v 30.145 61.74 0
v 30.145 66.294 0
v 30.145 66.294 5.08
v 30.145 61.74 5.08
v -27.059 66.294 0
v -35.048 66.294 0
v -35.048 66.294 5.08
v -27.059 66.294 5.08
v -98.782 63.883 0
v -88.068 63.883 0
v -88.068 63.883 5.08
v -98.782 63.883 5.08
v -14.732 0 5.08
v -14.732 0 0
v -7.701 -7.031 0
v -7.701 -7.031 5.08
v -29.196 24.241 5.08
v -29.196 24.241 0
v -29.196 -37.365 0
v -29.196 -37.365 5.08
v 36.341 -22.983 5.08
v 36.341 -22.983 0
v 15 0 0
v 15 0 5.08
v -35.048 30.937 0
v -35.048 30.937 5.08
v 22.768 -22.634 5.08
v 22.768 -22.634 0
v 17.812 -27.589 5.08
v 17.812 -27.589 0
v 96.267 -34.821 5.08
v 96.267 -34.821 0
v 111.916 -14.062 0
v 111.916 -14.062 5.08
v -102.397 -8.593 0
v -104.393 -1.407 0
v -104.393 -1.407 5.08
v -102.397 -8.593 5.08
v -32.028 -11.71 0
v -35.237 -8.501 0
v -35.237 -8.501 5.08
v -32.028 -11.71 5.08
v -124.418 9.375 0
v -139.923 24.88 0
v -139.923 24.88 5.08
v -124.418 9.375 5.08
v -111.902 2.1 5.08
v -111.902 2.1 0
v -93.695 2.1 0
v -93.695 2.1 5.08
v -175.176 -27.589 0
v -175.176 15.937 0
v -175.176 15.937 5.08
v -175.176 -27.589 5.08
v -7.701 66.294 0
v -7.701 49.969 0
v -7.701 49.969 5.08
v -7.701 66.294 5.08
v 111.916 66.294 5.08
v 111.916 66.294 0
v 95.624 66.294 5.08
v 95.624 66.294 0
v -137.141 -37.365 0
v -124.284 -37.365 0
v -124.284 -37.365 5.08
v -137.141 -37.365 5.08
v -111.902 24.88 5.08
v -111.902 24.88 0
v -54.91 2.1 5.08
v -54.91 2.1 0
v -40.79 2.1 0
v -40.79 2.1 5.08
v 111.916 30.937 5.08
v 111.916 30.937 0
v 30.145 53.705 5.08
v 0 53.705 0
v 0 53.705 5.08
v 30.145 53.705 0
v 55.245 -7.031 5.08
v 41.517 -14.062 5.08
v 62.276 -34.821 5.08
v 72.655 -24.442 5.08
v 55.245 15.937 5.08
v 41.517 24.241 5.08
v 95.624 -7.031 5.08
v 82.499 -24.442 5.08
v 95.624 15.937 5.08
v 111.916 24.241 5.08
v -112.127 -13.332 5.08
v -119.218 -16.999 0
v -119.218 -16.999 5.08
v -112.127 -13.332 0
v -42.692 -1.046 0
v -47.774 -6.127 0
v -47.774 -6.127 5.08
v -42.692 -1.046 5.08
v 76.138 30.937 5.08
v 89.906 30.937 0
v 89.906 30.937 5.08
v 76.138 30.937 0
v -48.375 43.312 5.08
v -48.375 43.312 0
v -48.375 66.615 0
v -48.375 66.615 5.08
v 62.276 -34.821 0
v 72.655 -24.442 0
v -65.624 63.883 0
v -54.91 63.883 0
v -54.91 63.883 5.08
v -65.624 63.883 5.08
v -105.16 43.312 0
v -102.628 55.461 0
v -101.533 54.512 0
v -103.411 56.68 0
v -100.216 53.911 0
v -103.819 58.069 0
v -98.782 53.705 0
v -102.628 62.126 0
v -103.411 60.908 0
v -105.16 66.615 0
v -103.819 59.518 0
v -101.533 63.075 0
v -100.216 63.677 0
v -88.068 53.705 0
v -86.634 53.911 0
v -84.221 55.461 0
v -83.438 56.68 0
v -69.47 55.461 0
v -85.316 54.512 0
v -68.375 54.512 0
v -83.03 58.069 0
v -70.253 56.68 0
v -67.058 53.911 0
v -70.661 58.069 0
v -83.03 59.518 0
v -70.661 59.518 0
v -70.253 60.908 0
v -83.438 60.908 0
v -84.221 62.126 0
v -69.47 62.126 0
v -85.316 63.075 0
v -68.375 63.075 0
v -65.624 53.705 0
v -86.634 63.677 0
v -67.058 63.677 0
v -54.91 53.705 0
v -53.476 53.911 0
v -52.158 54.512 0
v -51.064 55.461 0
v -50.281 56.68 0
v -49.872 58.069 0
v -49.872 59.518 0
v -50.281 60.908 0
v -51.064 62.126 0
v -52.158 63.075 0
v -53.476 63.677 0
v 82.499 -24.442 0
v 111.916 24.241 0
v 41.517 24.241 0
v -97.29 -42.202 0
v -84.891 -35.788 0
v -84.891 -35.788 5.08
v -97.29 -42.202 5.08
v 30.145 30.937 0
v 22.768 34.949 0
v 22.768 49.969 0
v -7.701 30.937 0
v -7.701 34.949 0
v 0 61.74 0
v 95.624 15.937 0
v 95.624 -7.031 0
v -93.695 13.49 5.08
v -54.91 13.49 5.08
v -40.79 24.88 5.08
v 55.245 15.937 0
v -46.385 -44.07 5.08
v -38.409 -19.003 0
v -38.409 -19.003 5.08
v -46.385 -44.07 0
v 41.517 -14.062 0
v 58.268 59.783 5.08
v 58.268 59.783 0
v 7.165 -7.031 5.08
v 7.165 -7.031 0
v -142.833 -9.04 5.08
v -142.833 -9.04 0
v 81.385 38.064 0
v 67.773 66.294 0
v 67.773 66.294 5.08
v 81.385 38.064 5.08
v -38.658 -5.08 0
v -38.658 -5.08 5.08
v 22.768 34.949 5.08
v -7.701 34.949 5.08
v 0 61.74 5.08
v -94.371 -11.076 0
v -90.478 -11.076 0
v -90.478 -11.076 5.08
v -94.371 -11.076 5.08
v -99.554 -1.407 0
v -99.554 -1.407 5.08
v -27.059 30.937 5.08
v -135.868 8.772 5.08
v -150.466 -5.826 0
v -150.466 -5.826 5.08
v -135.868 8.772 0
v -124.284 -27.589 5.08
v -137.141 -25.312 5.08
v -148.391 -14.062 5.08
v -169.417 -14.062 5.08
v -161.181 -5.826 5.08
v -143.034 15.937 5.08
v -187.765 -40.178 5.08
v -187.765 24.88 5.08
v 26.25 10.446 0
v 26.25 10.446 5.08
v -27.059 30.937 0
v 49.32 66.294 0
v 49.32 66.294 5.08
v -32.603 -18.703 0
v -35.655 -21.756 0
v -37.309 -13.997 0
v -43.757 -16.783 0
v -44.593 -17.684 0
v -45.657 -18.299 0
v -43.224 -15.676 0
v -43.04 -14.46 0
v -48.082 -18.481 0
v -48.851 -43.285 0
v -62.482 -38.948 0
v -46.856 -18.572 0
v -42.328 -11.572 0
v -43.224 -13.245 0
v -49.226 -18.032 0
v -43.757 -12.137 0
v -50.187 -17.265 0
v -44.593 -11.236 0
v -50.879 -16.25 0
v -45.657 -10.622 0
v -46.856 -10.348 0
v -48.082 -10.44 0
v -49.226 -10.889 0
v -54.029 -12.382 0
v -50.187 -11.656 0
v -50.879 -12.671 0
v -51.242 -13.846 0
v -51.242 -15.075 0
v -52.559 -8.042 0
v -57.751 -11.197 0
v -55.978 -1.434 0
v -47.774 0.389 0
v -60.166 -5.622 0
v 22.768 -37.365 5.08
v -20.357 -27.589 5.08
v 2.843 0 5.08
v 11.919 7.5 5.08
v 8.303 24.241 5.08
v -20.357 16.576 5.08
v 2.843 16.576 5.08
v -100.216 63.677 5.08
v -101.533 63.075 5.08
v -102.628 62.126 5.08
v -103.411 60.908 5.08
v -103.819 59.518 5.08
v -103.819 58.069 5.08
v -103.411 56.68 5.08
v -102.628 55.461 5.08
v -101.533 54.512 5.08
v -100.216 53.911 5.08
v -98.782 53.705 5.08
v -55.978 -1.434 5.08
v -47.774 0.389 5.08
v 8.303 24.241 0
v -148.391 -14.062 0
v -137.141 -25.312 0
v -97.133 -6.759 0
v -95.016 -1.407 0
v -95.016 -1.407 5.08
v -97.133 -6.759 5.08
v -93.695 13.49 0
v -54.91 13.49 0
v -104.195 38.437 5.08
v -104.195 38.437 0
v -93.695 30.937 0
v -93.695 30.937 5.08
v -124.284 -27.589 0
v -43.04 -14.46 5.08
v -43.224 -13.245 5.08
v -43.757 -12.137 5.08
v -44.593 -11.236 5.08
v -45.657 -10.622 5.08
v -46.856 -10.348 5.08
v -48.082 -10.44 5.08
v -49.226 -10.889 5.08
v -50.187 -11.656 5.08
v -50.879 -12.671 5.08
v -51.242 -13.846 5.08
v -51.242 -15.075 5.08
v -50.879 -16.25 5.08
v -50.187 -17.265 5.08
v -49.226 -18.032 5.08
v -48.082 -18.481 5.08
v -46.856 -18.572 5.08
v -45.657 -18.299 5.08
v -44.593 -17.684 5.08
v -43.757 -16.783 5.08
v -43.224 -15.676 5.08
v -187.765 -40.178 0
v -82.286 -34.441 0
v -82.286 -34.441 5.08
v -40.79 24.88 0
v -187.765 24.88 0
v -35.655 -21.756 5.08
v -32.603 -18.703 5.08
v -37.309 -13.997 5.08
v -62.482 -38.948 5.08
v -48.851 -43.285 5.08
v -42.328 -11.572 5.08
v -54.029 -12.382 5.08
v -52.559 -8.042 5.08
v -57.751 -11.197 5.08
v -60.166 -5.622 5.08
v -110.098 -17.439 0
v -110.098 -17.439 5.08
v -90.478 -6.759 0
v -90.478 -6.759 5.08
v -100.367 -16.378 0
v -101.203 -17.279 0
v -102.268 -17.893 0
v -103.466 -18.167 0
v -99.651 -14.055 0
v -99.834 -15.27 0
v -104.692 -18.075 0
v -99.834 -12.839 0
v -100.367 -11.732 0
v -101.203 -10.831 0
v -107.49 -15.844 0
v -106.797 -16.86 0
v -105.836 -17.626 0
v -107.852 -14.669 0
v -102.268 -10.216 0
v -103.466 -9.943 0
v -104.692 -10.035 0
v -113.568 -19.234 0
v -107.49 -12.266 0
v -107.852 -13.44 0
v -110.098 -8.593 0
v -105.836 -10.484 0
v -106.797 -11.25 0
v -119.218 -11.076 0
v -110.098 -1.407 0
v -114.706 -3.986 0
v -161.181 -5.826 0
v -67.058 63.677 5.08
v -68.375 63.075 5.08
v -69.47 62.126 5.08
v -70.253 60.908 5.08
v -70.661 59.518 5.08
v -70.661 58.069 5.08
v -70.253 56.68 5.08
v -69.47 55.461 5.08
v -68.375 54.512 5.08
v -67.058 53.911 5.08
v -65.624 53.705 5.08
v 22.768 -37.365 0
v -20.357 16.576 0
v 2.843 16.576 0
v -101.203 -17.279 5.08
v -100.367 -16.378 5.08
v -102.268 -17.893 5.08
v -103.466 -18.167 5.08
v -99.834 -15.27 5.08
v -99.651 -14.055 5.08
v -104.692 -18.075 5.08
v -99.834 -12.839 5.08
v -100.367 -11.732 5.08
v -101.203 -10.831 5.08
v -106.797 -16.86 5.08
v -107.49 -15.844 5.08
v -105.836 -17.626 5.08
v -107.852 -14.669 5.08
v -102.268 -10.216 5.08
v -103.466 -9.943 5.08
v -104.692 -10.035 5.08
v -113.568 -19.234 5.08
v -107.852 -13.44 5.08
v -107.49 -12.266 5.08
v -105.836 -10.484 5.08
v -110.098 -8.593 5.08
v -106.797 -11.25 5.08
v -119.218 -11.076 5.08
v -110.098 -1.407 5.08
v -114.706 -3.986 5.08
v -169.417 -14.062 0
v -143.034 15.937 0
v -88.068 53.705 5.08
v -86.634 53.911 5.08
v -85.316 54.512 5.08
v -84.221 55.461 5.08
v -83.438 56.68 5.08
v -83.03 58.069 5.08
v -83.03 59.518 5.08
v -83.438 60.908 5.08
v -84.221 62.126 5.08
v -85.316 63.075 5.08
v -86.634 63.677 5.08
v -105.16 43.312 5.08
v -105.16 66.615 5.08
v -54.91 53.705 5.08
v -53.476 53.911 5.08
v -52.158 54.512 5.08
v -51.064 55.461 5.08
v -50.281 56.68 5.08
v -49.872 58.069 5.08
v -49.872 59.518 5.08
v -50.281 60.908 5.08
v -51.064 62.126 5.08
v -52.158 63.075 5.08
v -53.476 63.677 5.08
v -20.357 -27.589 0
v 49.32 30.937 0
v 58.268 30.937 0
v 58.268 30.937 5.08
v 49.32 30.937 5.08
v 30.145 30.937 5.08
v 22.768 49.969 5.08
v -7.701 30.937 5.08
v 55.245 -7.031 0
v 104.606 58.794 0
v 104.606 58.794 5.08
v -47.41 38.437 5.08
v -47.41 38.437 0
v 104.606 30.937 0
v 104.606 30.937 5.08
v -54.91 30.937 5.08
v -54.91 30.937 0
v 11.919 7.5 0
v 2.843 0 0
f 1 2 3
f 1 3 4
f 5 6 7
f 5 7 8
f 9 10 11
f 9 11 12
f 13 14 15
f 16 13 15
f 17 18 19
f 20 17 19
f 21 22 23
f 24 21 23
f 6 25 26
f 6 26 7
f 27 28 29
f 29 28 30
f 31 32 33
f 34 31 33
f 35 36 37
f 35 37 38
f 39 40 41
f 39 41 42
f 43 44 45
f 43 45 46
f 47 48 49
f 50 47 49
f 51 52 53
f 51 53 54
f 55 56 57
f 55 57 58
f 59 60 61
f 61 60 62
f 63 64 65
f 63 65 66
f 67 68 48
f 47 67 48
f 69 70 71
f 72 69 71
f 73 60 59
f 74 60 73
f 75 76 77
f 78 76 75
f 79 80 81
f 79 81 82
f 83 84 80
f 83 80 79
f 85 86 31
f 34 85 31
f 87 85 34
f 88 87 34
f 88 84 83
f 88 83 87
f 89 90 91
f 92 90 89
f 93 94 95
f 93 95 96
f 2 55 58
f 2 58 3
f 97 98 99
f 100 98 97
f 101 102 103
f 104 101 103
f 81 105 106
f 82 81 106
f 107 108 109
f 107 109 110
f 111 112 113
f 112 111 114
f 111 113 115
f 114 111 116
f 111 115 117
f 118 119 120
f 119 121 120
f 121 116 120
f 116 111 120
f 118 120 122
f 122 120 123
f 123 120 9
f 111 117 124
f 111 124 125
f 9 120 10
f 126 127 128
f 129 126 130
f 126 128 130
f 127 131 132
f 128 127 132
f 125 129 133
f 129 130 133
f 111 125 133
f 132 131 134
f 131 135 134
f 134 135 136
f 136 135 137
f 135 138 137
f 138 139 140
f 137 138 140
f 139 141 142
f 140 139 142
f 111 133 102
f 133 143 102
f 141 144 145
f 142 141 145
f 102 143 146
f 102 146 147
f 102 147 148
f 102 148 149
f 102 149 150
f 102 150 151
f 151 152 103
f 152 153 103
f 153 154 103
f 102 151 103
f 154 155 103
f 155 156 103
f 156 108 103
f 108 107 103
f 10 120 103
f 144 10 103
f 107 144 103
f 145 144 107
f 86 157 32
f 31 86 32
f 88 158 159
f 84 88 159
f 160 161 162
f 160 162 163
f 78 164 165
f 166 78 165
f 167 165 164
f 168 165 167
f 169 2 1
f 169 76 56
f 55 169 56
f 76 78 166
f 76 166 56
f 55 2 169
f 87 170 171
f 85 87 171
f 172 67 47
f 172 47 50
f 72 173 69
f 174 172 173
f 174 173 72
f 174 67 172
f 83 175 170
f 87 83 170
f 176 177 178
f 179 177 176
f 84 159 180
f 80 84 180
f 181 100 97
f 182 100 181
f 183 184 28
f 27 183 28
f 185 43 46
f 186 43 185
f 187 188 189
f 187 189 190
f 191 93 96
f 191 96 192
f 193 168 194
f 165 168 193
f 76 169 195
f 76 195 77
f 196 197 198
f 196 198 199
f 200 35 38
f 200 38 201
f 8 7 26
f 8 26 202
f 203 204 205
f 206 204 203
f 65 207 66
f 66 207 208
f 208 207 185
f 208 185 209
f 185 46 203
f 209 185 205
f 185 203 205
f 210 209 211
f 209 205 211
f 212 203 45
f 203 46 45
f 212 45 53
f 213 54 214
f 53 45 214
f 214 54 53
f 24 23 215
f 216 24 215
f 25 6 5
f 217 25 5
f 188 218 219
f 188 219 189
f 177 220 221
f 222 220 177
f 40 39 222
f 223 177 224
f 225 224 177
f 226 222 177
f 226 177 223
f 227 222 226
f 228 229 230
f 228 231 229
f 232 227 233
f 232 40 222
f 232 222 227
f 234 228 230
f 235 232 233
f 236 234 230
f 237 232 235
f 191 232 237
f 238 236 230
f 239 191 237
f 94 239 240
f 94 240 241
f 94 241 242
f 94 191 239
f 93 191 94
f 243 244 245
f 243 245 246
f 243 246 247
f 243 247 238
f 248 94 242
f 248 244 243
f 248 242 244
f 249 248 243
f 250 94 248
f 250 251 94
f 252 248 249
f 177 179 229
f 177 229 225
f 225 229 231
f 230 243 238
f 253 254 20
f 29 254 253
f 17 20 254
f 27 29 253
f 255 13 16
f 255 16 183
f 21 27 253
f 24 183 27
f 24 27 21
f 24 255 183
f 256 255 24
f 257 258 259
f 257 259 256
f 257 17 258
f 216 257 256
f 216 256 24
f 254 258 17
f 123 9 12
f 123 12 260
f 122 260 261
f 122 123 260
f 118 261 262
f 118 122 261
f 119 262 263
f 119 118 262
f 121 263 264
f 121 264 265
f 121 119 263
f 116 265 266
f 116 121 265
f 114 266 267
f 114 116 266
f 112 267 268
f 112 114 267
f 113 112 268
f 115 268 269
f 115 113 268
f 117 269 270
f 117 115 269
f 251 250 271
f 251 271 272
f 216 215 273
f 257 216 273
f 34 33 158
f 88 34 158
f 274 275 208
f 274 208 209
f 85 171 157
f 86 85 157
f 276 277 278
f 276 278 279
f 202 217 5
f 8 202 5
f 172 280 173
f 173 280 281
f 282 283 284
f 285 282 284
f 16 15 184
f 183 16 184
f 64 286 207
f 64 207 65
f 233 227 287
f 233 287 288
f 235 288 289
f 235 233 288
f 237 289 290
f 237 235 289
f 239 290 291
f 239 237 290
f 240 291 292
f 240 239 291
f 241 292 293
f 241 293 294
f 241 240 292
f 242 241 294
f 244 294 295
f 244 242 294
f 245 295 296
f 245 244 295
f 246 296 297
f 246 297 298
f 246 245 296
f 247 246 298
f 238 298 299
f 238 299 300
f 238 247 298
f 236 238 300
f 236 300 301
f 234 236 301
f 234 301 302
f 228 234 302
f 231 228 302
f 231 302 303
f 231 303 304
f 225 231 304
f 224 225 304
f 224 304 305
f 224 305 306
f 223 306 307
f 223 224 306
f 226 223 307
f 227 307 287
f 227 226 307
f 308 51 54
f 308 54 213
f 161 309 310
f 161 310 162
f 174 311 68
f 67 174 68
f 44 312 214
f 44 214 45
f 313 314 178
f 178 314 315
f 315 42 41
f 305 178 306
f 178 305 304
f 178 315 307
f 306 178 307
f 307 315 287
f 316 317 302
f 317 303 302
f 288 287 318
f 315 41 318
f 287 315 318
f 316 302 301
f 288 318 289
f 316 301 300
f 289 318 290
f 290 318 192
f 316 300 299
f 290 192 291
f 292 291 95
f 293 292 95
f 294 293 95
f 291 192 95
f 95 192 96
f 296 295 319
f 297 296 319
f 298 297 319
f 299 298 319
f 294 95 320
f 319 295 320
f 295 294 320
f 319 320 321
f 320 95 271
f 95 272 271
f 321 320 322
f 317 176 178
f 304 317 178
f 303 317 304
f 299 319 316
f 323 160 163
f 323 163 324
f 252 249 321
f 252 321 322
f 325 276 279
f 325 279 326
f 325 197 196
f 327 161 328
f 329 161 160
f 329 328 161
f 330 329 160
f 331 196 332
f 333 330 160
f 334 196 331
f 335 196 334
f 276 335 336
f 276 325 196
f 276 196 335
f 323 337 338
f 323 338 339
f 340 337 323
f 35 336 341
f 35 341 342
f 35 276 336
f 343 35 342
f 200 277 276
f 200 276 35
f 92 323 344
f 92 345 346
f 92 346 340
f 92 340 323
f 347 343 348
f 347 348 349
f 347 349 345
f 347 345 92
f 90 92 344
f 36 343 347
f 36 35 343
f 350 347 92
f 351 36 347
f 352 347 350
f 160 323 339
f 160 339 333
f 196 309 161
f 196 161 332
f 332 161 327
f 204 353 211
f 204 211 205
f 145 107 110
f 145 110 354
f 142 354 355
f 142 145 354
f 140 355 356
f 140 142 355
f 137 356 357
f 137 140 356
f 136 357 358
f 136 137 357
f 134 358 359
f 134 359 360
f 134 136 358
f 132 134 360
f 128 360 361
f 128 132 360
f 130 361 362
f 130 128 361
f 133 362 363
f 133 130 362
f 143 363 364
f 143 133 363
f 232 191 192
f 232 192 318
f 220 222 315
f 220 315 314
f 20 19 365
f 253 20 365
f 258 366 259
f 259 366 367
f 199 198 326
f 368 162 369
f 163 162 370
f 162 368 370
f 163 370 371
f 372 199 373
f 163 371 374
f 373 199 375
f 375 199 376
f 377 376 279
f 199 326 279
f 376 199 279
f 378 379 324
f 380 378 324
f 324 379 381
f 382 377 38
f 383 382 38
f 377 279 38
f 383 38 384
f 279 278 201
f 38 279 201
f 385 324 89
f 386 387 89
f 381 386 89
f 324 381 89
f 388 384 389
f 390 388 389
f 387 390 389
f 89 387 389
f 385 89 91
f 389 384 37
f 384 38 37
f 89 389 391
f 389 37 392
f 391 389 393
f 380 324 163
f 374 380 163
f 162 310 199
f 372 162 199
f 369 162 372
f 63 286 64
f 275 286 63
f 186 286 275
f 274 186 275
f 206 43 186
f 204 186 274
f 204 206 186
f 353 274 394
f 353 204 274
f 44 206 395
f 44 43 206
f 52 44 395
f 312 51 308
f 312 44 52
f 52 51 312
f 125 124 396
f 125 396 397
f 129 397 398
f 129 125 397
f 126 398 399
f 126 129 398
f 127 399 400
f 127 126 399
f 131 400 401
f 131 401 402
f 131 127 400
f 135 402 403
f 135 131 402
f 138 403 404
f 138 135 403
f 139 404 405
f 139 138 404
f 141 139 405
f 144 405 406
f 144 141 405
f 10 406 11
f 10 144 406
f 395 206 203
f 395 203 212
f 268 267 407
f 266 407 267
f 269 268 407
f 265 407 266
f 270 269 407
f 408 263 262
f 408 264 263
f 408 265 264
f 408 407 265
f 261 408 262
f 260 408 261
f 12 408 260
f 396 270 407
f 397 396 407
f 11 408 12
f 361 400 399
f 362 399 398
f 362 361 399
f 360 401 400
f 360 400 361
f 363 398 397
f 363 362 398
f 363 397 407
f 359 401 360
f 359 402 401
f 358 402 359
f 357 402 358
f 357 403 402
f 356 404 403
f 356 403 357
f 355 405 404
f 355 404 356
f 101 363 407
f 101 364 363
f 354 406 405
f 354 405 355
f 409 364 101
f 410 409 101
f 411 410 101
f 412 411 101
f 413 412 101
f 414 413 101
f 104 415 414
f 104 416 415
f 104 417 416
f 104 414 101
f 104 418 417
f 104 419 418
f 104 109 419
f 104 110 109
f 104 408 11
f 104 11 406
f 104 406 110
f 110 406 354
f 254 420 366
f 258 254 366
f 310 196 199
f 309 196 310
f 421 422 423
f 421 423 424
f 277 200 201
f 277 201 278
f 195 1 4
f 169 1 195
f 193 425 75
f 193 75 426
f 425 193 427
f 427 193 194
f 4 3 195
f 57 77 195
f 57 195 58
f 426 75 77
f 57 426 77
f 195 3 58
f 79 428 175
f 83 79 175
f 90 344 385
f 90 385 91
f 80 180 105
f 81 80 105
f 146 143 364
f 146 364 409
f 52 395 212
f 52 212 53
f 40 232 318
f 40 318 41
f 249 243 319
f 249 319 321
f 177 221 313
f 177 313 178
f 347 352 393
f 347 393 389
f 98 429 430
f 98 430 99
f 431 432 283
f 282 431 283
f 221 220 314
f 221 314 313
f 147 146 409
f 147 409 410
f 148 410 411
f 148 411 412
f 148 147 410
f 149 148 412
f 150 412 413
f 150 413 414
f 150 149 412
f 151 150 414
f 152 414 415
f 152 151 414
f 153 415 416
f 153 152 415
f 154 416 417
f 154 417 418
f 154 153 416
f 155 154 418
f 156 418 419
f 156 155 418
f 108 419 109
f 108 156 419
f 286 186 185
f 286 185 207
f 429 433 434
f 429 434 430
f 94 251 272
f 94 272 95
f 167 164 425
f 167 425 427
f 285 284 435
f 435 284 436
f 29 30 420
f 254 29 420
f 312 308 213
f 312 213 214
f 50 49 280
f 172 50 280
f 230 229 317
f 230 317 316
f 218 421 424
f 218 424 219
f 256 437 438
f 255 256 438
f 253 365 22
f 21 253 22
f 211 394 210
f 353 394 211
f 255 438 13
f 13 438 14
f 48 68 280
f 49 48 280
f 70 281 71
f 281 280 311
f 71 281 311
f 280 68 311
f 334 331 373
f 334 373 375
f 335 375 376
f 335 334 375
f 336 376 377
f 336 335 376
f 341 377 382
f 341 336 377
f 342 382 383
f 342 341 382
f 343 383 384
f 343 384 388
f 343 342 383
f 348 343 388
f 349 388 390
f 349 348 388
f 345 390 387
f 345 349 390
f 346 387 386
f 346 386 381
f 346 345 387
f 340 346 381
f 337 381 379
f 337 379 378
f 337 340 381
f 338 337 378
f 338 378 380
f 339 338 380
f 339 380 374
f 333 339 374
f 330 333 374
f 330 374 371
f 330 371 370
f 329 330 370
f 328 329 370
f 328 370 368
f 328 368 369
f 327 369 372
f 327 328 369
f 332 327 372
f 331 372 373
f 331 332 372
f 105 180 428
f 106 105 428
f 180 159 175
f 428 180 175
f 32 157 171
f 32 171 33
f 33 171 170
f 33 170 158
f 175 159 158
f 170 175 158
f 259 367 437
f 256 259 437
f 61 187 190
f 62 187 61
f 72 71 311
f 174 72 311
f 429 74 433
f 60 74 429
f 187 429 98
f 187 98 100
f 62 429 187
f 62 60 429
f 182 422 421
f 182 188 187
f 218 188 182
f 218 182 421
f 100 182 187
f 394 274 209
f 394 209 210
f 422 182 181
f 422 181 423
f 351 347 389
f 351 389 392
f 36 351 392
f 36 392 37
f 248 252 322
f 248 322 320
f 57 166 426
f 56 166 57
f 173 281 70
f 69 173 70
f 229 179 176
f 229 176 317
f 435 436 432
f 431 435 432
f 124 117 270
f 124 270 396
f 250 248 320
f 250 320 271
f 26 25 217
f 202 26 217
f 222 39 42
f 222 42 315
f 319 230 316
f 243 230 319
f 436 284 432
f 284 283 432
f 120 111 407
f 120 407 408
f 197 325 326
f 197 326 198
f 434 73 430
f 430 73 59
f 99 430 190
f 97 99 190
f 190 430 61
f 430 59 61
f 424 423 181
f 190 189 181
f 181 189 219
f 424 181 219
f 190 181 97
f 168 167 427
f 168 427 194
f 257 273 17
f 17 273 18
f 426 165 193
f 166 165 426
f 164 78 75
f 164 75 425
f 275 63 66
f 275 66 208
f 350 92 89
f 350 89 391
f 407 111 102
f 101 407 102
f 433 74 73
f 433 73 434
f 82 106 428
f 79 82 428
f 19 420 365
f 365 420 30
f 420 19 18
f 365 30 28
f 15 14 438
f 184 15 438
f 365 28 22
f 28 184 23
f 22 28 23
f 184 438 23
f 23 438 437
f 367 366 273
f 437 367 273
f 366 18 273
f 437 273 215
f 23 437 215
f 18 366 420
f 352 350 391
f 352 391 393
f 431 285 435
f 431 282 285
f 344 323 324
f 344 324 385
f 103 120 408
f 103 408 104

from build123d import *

# Parameters (mm, degrees)
BOSS_EXTRUDE2_DEPTH    = 5.08
SKETCH1_R              = 4.12365759
BOSS_EXTRUDE2_2_DEPTH  = 5.08
BOSS_EXTRUDE2_3_DEPTH  = 5.08
BOSS_EXTRUDE2_4_DEPTH  = 5.08
BOSS_EXTRUDE2_5_DEPTH  = 5.08
BOSS_EXTRUDE2_6_DEPTH  = 5.08
BOSS_EXTRUDE2_7_DEPTH  = 5.08
BOSS_EXTRUDE2_8_DEPTH  = 5.08
BOSS_EXTRUDE2_9_DEPTH  = 5.08
SKETCH1_W              = 56.784840995
SKETCH1_H              = 23.30321305
BOSS_EXTRUDE2_10_DEPTH = 5.08
SKETCH1_W_2            = 7.98939124
SKETCH1_H_2            = 35.356599111
BOSS_EXTRUDE2_11_DEPTH = 5.08


with BuildPart() as part:
    # Sketch1 → Boss-Extrude2 (new body)
    with BuildSketch(Plane.XY):
        Polygon((-54.90986983, 2.100106655), (-40.789904432, 2.100106655), (-40.789904432, 24.879849932), (-45.332766375, 24.879849932), (-48.688287769, 24.879849932), (-105.473128764, 24.879849932), (-111.90160133, 24.879849932), (-111.90160133, 2.100106655), (-93.694987642, 2.100106655), (-93.694987642, 13.489978293), (-54.90986983, 13.489978293), align=None)
    extrude(amount=BOSS_EXTRUDE2_DEPTH)


with BuildPart() as body_2:
    # Sketch1 → Boss-Extrude2 2 (new body)
    with BuildSketch(Plane.XY):
        Polygon((-82.285889521, -34.441030144), (-84.890843391, -35.788420077), (-97.289742004, -42.201643497), (-110.097906272, -17.439192577), (-113.56798426, -19.234060502), (-119.217545048, -16.998965022), (-112.12746233, -13.331680858), (-119.217545048, -11.075745447), (-114.705674228, -3.985662729), (-110.097906272, -8.593430684), (-110.097906272, -1.407450831), (-104.392826637, -1.407450831), (-102.397131845, -8.593430684), (-99.554193838, -1.407450831), (-95.015933067, -1.407450831), (-97.133073497, -6.758861392), (-90.477672296, -6.758861392), (-90.477672296, -11.075745447), (-94.371381606, -11.075745447), align=None)
        with Locations((-103.77421688, -14.054851273)):
            Circle(SKETCH1_R, mode=Mode.SUBTRACT)
    extrude(amount=BOSS_EXTRUDE2_2_DEPTH)


with BuildPart() as body_3:
    # Sketch1 → Boss-Extrude2 3 (new body)
    with BuildSketch(Plane.XY):
        Polygon((-35.236909604, -8.501269043), (-32.027874638, -11.710304009), (-37.308937689, -13.997278351), (-32.602858369, -18.703357672), (-35.655356358, -21.755855661), (-38.408624614, -19.002587404), (-46.384642461, -44.070072065), (-48.851145887, -43.28527552), (-62.481550623, -38.948328558), (-54.028593468, -12.381891785), (-57.751472426, -11.19733939), (-60.165863999, -5.622045475), (-52.559256928, -8.042329543), (-55.977515271, -1.433696747), (-47.773695248, 0.389374369), (-47.773695248, -6.126993566), (-42.692440165, -1.045738482), (-38.658339667, -5.07983898), (-42.32842543, -11.572263384), align=None)
        with Locations((-47.163979131, -14.460324751)):
            Circle(SKETCH1_R, mode=Mode.SUBTRACT)
    extrude(amount=BOSS_EXTRUDE2_3_DEPTH)


with BuildPart() as body_4:
    # Sketch1 → Boss-Extrude2 4 (new body)
    with BuildSketch(Plane.XY):
        Polygon((81.385387958, 38.064340239), (95.623529412, 66.293623332), (104.606250712, 66.293623332), (111.915994426, 66.293623332), (111.915994426, 30.937024221), (104.606250712, 30.937024221), (104.606250712, 58.793738672), (89.90577083, 30.937024221), (76.137891998, 30.937024221), (58.26778152, 59.783295915), (58.26778152, 30.937024221), (49.319663331, 30.937024221), (49.319663331, 66.293623332), (67.772807532, 66.293623332), align=None)
    extrude(amount=BOSS_EXTRUDE2_4_DEPTH)


with BuildPart() as body_5:
    # Sketch1 → Boss-Extrude2 5 (new body)
    with BuildSketch(Plane.XY):
        Polygon((0, 61.740121931), (0, 53.704531224), (30.145124355, 53.704531224), (30.145124355, 30.937024221), (-7.700774427, 30.937024221), (-7.700774427, 34.948768743), (22.767507003, 34.948768743), (22.767507003, 49.968824274), (-7.700774427, 49.968824274), (-7.700774427, 66.293623332), (30.145124355, 66.293623332), (30.145124355, 61.740121931), align=None)
    extrude(amount=BOSS_EXTRUDE2_5_DEPTH)


with BuildPart() as body_6:
    # Sketch1 → Boss-Extrude2 6 (new body)
    with BuildSketch(Plane.XY):
        Polygon((-47.409985171, 38.436908881), (-104.194826166, 38.436908881), (-93.694987642, 30.937024221), (-54.90986983, 30.937024221), align=None)
    extrude(amount=BOSS_EXTRUDE2_6_DEPTH)


with BuildPart() as body_7:
    # Sketch1 → Boss-Extrude2 7 (new body)
    with BuildSketch(Plane.XY):
        Polygon((-124.283802933, -37.365496787), (-137.140748064, -37.365496787), (-137.140748064, -25.312110727), (-148.390575054, -14.062283737), (-169.417037403, -14.062283737), (-161.180556929, -5.825803262), (-150.466435986, -5.825803262), (-135.868446202, 8.772186522), (-143.033514582, 15.937254902), (-175.17587741, 15.937254902), (-175.17587741, -27.588861427), (-187.764969517, -40.177953534), (-187.764969517, 24.879849932), (-139.922723552, 24.879849932), (-124.417729445, 9.374855825), (-142.832624815, -9.040039545), (-124.283802933, -27.588861427), align=None)
    extrude(amount=BOSS_EXTRUDE2_7_DEPTH)


with BuildPart() as body_8:
    # Sketch1 → Boss-Extrude2 8 (new body)
    with BuildSketch(Plane.XY):
        Polygon((111.915994426, -14.062283737), (111.915994426, 24.240698632), (41.517218652, 24.240698632), (41.517218652, -14.062283737), (62.275827978, -34.820893063), (72.655132641, -24.4415884), (55.24468611, -7.031141869), (55.24468611, 15.937254902), (95.623529412, 15.937254902), (95.623529412, -7.031141869), (82.498731257, -24.4415884), (96.267196627, -34.820893063), align=None)
    extrude(amount=BOSS_EXTRUDE2_8_DEPTH)


with BuildPart() as body_9:
    # Sketch1 → Boss-Extrude2 9 (new body)
    with BuildSketch(Plane.XY):
        Polygon((-29.195979568, -37.365496787), (22.767507003, -37.365496787), (36.34068378, -22.982523266), (14.999769319, 0), (26.249596309, 10.446267919), (8.30344373, 24.240698632), (-29.195979568, 24.240698632), align=None)
        Polygon((2.842938007, 16.576406201), (11.919459549, 7.49988466), (2.842938007, 0), (-14.731916296, 0), (-7.700774427, -7.031141869), (7.16506838, -7.031141869), (22.767507003, -22.633580491), (17.812226067, -27.588861427), (-20.356829791, -27.588861427), (-20.356829791, 16.576406201), align=None, mode=Mode.SUBTRACT)
    extrude(amount=BOSS_EXTRUDE2_9_DEPTH)


with BuildPart() as body_10:
    # Sketch1 → Boss-Extrude2 10 (new body)
    with BuildSketch(Plane.XY):
        with Locations((-76.767269056, 54.963637936)):
            Rectangle(SKETCH1_W, SKETCH1_H)
        with BuildLine():
            ThreePointArc((-88.067611926, 53.704531224), (-82.978404478, 58.793738672), (-88.067611926, 63.88294612))
            Line((-88.067611926, 63.88294612), (-98.781732868, 63.88294612))
            ThreePointArc((-98.781732868, 63.88294612), (-103.870940316, 58.793738672), (-98.781732868, 53.704531224))
            Line((-98.781732868, 53.704531224), (-88.067611926, 53.704531224))
        make_face(mode=Mode.SUBTRACT)
        with BuildLine():
            ThreePointArc((-54.90986983, 53.704531224), (-49.820662383, 58.793738672), (-54.90986983, 63.88294612))
            Line((-54.90986983, 63.88294612), (-65.623990773, 63.88294612))
            ThreePointArc((-65.623990773, 63.88294612), (-70.71319822, 58.793738672), (-65.623990773, 53.704531224))
            Line((-65.623990773, 53.704531224), (-54.90986983, 53.704531224))
        make_face(mode=Mode.SUBTRACT)
    extrude(amount=BOSS_EXTRUDE2_10_DEPTH)


with BuildPart() as body_11:
    # Sketch1 → Boss-Extrude2 11 (new body)
    with BuildSketch(Plane.XY):
        with Locations((-31.053612545, 48.615323777)):
            Rectangle(SKETCH1_W_2, SKETCH1_H_2)
    extrude(amount=BOSS_EXTRUDE2_11_DEPTH)


solid = Compound([part.part, body_2.part, body_3.part, body_4.part, body_5.part, body_6.part, body_7.part, body_8.part, body_9.part, body_10.part, body_11.part])
